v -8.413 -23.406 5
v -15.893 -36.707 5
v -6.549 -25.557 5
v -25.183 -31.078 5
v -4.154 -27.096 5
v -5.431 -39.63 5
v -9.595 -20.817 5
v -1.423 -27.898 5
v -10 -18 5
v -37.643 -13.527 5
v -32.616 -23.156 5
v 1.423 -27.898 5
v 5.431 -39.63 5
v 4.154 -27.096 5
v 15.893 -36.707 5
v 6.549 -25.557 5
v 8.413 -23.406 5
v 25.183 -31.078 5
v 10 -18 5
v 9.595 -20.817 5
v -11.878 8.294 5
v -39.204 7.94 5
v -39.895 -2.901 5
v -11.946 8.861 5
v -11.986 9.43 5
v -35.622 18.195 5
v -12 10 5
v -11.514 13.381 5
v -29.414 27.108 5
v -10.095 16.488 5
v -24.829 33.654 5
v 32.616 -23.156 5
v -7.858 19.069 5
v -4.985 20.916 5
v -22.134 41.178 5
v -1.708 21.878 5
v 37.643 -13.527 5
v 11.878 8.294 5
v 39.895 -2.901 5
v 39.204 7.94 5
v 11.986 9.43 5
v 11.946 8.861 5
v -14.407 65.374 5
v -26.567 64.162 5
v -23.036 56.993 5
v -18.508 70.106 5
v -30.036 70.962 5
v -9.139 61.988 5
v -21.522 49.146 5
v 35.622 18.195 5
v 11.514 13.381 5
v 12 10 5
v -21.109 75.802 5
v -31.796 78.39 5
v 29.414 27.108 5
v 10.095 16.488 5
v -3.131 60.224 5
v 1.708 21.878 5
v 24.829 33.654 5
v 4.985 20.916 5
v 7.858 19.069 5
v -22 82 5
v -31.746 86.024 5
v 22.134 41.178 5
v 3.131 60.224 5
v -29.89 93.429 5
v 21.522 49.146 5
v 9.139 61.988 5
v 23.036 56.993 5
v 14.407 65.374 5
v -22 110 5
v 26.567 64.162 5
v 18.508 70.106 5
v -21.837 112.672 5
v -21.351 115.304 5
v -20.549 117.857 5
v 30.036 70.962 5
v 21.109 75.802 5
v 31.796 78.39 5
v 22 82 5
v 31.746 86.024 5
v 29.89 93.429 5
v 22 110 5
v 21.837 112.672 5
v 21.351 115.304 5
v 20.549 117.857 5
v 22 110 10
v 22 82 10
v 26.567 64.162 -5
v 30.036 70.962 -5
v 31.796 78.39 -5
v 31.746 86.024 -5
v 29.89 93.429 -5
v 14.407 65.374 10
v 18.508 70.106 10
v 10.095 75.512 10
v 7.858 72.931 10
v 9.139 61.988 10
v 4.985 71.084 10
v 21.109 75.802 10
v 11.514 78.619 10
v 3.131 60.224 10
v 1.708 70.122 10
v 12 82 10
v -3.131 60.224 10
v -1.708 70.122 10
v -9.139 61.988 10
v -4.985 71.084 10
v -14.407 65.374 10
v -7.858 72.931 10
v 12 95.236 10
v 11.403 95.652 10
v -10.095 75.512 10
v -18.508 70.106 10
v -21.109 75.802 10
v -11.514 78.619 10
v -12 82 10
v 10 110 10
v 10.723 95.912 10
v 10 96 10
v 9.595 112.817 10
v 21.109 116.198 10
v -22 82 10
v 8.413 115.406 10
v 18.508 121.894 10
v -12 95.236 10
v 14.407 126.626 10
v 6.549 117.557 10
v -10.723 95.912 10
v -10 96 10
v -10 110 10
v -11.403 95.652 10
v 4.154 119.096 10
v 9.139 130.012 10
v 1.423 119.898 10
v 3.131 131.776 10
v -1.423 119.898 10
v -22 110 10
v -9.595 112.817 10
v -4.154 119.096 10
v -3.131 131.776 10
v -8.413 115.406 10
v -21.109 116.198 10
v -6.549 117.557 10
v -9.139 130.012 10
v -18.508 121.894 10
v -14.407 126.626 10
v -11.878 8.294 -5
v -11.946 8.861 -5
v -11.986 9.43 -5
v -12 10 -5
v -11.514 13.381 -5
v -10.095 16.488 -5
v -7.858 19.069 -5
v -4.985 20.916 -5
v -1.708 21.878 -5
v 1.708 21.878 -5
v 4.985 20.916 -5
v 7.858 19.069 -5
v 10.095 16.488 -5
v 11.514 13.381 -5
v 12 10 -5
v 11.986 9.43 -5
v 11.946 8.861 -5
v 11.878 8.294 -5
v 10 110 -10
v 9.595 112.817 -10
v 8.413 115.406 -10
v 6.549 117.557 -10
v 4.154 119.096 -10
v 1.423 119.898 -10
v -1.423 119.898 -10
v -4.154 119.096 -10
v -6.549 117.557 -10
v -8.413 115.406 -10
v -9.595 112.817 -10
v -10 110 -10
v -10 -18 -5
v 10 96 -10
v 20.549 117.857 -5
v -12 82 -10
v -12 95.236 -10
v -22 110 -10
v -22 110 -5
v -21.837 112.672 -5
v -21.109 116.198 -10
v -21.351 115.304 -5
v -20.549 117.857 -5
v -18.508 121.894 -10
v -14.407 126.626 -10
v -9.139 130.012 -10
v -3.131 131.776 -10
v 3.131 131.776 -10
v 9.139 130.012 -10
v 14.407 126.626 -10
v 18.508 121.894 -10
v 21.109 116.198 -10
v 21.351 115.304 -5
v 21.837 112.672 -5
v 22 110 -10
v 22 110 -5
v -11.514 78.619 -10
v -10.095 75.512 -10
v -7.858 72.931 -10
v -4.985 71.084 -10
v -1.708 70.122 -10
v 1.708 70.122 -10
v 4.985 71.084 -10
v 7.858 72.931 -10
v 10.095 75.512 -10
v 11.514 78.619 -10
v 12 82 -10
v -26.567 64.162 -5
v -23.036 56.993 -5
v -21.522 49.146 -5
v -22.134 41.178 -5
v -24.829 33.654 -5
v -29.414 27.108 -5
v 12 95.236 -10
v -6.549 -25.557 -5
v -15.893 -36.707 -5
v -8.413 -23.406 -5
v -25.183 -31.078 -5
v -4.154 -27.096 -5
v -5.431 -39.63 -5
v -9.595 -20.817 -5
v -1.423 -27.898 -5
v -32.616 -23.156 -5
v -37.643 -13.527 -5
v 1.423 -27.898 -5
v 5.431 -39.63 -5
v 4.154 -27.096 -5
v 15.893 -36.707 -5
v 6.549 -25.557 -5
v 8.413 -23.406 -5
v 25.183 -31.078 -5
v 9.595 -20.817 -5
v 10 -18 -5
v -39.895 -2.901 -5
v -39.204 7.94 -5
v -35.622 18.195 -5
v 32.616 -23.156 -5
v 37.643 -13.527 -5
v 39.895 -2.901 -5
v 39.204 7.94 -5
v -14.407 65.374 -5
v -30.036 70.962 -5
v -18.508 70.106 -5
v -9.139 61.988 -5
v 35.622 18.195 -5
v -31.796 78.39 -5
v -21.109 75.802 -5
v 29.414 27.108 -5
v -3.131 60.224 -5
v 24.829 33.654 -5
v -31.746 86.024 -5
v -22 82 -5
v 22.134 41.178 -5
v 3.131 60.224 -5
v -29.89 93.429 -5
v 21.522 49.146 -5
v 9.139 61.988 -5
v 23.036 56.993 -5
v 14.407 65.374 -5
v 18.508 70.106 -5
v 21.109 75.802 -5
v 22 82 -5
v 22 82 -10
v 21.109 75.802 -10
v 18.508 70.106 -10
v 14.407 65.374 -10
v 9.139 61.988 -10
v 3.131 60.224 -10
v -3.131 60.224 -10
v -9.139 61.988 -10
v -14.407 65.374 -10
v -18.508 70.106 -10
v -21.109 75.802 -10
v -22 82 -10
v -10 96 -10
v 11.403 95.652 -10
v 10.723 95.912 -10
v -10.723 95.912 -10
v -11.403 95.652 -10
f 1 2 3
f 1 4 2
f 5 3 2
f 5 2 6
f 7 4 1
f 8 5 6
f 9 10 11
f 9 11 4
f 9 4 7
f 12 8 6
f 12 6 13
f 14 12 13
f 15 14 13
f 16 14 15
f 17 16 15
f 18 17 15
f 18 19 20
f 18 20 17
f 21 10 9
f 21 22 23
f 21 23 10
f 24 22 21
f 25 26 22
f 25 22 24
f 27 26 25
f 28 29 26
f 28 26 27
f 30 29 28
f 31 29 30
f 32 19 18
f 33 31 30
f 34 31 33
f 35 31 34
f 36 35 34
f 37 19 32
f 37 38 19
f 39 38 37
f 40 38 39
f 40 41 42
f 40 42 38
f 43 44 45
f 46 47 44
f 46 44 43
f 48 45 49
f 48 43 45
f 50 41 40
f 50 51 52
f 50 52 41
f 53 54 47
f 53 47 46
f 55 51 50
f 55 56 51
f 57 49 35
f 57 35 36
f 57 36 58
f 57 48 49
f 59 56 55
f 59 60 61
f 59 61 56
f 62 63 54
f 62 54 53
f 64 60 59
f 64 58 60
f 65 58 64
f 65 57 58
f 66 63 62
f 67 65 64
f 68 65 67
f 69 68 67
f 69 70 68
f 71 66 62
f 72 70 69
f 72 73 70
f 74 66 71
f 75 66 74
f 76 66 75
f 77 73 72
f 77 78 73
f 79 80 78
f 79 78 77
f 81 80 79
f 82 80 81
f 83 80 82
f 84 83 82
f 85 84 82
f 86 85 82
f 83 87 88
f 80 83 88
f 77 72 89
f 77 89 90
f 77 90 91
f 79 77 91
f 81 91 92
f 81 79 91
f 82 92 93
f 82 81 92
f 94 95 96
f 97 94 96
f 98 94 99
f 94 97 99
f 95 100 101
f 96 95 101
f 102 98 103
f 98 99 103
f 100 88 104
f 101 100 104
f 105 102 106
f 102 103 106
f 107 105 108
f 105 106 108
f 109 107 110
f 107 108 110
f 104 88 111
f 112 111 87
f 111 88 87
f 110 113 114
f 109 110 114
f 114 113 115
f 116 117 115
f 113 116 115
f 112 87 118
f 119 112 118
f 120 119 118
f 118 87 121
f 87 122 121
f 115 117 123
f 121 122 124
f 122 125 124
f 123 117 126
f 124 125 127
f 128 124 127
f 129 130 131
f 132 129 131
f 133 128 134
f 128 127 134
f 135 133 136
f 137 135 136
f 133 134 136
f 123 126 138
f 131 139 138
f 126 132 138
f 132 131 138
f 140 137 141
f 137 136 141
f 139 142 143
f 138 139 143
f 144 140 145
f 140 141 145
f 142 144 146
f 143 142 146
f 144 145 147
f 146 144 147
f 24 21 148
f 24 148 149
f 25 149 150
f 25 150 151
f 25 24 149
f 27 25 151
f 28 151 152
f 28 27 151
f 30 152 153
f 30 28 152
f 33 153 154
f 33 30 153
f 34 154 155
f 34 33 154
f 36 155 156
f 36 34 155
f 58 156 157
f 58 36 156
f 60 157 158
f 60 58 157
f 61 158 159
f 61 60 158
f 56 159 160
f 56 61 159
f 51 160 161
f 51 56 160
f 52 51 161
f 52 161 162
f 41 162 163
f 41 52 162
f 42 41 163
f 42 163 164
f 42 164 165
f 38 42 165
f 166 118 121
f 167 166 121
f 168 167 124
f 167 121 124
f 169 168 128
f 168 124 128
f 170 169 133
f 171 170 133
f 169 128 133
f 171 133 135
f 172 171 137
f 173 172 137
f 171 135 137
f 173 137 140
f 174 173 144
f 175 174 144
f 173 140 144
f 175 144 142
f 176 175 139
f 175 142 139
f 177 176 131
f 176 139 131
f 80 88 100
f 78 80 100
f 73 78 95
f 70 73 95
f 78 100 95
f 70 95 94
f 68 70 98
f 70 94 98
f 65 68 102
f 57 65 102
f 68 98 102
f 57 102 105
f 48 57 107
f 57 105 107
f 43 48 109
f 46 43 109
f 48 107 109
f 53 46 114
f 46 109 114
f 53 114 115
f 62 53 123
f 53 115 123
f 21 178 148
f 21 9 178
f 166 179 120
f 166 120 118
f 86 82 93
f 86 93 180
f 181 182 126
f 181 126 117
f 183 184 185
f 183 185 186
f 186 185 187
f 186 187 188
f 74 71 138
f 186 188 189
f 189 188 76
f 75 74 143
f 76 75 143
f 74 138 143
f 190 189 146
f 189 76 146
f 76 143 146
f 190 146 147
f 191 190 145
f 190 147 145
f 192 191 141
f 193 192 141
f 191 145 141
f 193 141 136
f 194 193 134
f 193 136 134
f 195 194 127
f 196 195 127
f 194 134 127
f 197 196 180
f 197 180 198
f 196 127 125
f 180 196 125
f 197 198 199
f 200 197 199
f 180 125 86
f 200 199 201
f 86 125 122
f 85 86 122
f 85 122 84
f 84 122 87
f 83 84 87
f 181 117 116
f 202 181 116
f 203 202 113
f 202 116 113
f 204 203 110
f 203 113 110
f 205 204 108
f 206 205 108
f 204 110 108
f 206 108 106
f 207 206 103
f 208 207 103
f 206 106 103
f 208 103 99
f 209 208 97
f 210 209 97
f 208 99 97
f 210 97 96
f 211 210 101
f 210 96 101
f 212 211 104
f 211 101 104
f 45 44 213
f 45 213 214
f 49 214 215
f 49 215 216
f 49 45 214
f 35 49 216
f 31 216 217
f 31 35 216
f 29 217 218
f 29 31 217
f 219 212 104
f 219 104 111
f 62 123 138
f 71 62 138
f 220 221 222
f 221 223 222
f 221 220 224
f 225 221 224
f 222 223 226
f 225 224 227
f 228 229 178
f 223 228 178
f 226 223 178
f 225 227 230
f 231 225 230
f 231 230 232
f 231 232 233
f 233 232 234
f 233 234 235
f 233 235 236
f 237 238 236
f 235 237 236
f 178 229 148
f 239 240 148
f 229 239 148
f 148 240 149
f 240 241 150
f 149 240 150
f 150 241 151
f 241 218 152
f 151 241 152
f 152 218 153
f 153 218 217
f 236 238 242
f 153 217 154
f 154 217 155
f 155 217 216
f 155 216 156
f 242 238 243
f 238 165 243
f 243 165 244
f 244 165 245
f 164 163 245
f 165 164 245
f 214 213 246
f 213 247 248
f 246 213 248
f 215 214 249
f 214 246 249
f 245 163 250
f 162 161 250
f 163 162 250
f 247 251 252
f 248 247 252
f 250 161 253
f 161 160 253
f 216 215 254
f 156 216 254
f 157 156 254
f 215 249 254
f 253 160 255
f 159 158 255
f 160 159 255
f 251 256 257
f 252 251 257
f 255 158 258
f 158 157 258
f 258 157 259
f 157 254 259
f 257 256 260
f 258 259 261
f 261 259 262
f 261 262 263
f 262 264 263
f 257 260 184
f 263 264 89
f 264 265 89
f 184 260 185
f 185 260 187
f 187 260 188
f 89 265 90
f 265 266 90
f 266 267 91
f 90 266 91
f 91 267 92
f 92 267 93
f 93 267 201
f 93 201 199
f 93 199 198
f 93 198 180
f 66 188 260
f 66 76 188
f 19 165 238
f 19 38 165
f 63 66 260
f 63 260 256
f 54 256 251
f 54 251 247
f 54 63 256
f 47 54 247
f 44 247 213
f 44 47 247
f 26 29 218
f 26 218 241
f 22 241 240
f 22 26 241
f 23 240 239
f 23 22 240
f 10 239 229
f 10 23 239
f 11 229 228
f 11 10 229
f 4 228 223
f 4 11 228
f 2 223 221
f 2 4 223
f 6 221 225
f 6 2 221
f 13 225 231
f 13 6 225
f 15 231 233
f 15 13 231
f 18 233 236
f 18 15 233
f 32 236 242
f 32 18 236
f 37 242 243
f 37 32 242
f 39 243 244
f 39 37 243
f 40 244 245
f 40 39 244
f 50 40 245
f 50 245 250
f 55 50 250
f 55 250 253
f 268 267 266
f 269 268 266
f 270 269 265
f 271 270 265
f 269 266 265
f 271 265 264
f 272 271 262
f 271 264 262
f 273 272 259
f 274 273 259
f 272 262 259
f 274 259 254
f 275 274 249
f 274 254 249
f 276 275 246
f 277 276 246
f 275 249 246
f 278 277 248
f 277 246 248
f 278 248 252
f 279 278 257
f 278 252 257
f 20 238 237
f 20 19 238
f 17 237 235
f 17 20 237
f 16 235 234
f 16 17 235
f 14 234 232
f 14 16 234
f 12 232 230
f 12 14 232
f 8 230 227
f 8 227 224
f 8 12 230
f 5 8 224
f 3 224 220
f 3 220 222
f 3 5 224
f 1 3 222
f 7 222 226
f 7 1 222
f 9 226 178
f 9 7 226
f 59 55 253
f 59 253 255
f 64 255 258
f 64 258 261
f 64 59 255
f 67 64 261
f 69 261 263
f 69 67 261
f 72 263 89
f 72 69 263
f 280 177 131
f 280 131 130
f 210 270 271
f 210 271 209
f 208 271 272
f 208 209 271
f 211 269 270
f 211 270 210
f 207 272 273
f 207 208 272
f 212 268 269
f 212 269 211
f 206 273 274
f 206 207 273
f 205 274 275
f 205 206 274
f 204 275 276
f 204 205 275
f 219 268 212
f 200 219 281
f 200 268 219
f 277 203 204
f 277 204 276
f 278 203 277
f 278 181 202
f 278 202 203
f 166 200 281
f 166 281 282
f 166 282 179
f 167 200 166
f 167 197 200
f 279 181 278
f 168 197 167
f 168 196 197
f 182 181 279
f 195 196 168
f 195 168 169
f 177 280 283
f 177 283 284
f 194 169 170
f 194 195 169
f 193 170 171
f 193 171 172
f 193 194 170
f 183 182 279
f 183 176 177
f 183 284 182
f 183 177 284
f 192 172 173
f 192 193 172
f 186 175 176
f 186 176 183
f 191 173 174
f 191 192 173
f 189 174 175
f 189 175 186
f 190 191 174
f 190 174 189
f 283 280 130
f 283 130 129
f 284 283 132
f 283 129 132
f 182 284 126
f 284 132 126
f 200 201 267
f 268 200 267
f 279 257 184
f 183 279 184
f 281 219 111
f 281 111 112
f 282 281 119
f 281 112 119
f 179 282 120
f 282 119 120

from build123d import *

# Parameters (mm, degrees)
BOSS_EXTRUDE1_DEPTH = 10
BOSS_EXTRUDE2_DEPTH = 5


with BuildPart() as part:
    # Sketch1 → Boss-Extrude1 (new, symmetric)
    with BuildSketch(Plane.XY):
        with BuildLine():
            ThreePointArc((20.54909502, 117.857142857), (0, 132), (-20.54909502, 117.857142857))
            ThreePointArc((-20.54909502, 117.857142857), (-21.634233178, 113.994991212), (-22, 110))
            Line((-22, 110), (-22, 82))
            ThreePointArc((-22, 82), (0, 60), (22, 82))
            Line((22, 82), (22, 110))
            ThreePointArc((22, 110), (21.634233178, 113.994991212), (20.54909502, 117.857142857))
        make_face()
        with BuildLine():
            Line((-12, 82), (-12, 95.236067977))
            ThreePointArc((-12, 95.236067977), (-11.070466269, 95.802517077), (-10, 96))
            Line((-10, 96), (-10, 110))
            ThreePointArc((-10, 110), (0, 120), (10, 110))
            Line((10, 110), (10, 96))
            ThreePointArc((10, 96), (11.070466269, 95.802517077), (12, 95.236067977))
            Line((12, 95.236067977), (12, 82))
            ThreePointArc((12, 82), (0, 70), (-12, 82))
        make_face(mode=Mode.SUBTRACT)
    extrude(amount=BOSS_EXTRUDE1_DEPTH, both=True)

    # Sketch1<3> → Boss-Extrude2 (add, symmetric)
    with BuildSketch(Plane.XY):
        with BuildLine():
            Line((-20.54909502, 117.857142857), (-29.889592756, 93.428571429))
            ThreePointArc((-29.889592756, 93.428571429), (-31.795758241, 78.390324411), (-26.567056796, 64.162077105))
            ThreePointArc((-26.567056796, 64.162077105), (-21.561800954, 45.141212789), (-29.413527167, 27.108013937))
            ThreePointArc((-29.413527167, 27.108013937), (0, -40), (29.413527167, 27.108013937))
            ThreePointArc((29.413527167, 27.108013937), (21.561800954, 45.141212789), (26.567056796, 64.162077105))
            ThreePointArc((26.567056796, 64.162077105), (31.795758241, 78.390324411), (29.889592756, 93.428571429))
            Line((29.889592756, 93.428571429), (20.54909502, 117.857142857))
            ThreePointArc((20.54909502, 117.857142857), (21.634233178, 113.994991212), (22, 110))
            Line((22, 110), (22, 82))
            ThreePointArc((22, 82), (0, 60), (-22, 82))
            Line((-22, 82), (-22, 110))
            ThreePointArc((-22, 110), (-21.634233178, 113.994991212), (-20.54909502, 117.857142857))
        make_face()
        with BuildLine():
            ThreePointArc((-11.878172589, 8.294416244), (-11.969504398, 9.1450354), (-12, 10))
            ThreePointArc((-12, 10), (0, 22), (12, 10))
            ThreePointArc((12, 10), (11.969504398, 9.1450354), (11.878172589, 8.294416244))
            Line((11.878172589, 8.294416244), (10, -18))
            ThreePointArc((10, -18), (0, -28), (-10, -18))
            Line((-10, -18), (-11.878172589, 8.294416244))
        make_face(mode=Mode.SUBTRACT)
    extrude(amount=BOSS_EXTRUDE2_DEPTH, both=True)


solid = part.part
